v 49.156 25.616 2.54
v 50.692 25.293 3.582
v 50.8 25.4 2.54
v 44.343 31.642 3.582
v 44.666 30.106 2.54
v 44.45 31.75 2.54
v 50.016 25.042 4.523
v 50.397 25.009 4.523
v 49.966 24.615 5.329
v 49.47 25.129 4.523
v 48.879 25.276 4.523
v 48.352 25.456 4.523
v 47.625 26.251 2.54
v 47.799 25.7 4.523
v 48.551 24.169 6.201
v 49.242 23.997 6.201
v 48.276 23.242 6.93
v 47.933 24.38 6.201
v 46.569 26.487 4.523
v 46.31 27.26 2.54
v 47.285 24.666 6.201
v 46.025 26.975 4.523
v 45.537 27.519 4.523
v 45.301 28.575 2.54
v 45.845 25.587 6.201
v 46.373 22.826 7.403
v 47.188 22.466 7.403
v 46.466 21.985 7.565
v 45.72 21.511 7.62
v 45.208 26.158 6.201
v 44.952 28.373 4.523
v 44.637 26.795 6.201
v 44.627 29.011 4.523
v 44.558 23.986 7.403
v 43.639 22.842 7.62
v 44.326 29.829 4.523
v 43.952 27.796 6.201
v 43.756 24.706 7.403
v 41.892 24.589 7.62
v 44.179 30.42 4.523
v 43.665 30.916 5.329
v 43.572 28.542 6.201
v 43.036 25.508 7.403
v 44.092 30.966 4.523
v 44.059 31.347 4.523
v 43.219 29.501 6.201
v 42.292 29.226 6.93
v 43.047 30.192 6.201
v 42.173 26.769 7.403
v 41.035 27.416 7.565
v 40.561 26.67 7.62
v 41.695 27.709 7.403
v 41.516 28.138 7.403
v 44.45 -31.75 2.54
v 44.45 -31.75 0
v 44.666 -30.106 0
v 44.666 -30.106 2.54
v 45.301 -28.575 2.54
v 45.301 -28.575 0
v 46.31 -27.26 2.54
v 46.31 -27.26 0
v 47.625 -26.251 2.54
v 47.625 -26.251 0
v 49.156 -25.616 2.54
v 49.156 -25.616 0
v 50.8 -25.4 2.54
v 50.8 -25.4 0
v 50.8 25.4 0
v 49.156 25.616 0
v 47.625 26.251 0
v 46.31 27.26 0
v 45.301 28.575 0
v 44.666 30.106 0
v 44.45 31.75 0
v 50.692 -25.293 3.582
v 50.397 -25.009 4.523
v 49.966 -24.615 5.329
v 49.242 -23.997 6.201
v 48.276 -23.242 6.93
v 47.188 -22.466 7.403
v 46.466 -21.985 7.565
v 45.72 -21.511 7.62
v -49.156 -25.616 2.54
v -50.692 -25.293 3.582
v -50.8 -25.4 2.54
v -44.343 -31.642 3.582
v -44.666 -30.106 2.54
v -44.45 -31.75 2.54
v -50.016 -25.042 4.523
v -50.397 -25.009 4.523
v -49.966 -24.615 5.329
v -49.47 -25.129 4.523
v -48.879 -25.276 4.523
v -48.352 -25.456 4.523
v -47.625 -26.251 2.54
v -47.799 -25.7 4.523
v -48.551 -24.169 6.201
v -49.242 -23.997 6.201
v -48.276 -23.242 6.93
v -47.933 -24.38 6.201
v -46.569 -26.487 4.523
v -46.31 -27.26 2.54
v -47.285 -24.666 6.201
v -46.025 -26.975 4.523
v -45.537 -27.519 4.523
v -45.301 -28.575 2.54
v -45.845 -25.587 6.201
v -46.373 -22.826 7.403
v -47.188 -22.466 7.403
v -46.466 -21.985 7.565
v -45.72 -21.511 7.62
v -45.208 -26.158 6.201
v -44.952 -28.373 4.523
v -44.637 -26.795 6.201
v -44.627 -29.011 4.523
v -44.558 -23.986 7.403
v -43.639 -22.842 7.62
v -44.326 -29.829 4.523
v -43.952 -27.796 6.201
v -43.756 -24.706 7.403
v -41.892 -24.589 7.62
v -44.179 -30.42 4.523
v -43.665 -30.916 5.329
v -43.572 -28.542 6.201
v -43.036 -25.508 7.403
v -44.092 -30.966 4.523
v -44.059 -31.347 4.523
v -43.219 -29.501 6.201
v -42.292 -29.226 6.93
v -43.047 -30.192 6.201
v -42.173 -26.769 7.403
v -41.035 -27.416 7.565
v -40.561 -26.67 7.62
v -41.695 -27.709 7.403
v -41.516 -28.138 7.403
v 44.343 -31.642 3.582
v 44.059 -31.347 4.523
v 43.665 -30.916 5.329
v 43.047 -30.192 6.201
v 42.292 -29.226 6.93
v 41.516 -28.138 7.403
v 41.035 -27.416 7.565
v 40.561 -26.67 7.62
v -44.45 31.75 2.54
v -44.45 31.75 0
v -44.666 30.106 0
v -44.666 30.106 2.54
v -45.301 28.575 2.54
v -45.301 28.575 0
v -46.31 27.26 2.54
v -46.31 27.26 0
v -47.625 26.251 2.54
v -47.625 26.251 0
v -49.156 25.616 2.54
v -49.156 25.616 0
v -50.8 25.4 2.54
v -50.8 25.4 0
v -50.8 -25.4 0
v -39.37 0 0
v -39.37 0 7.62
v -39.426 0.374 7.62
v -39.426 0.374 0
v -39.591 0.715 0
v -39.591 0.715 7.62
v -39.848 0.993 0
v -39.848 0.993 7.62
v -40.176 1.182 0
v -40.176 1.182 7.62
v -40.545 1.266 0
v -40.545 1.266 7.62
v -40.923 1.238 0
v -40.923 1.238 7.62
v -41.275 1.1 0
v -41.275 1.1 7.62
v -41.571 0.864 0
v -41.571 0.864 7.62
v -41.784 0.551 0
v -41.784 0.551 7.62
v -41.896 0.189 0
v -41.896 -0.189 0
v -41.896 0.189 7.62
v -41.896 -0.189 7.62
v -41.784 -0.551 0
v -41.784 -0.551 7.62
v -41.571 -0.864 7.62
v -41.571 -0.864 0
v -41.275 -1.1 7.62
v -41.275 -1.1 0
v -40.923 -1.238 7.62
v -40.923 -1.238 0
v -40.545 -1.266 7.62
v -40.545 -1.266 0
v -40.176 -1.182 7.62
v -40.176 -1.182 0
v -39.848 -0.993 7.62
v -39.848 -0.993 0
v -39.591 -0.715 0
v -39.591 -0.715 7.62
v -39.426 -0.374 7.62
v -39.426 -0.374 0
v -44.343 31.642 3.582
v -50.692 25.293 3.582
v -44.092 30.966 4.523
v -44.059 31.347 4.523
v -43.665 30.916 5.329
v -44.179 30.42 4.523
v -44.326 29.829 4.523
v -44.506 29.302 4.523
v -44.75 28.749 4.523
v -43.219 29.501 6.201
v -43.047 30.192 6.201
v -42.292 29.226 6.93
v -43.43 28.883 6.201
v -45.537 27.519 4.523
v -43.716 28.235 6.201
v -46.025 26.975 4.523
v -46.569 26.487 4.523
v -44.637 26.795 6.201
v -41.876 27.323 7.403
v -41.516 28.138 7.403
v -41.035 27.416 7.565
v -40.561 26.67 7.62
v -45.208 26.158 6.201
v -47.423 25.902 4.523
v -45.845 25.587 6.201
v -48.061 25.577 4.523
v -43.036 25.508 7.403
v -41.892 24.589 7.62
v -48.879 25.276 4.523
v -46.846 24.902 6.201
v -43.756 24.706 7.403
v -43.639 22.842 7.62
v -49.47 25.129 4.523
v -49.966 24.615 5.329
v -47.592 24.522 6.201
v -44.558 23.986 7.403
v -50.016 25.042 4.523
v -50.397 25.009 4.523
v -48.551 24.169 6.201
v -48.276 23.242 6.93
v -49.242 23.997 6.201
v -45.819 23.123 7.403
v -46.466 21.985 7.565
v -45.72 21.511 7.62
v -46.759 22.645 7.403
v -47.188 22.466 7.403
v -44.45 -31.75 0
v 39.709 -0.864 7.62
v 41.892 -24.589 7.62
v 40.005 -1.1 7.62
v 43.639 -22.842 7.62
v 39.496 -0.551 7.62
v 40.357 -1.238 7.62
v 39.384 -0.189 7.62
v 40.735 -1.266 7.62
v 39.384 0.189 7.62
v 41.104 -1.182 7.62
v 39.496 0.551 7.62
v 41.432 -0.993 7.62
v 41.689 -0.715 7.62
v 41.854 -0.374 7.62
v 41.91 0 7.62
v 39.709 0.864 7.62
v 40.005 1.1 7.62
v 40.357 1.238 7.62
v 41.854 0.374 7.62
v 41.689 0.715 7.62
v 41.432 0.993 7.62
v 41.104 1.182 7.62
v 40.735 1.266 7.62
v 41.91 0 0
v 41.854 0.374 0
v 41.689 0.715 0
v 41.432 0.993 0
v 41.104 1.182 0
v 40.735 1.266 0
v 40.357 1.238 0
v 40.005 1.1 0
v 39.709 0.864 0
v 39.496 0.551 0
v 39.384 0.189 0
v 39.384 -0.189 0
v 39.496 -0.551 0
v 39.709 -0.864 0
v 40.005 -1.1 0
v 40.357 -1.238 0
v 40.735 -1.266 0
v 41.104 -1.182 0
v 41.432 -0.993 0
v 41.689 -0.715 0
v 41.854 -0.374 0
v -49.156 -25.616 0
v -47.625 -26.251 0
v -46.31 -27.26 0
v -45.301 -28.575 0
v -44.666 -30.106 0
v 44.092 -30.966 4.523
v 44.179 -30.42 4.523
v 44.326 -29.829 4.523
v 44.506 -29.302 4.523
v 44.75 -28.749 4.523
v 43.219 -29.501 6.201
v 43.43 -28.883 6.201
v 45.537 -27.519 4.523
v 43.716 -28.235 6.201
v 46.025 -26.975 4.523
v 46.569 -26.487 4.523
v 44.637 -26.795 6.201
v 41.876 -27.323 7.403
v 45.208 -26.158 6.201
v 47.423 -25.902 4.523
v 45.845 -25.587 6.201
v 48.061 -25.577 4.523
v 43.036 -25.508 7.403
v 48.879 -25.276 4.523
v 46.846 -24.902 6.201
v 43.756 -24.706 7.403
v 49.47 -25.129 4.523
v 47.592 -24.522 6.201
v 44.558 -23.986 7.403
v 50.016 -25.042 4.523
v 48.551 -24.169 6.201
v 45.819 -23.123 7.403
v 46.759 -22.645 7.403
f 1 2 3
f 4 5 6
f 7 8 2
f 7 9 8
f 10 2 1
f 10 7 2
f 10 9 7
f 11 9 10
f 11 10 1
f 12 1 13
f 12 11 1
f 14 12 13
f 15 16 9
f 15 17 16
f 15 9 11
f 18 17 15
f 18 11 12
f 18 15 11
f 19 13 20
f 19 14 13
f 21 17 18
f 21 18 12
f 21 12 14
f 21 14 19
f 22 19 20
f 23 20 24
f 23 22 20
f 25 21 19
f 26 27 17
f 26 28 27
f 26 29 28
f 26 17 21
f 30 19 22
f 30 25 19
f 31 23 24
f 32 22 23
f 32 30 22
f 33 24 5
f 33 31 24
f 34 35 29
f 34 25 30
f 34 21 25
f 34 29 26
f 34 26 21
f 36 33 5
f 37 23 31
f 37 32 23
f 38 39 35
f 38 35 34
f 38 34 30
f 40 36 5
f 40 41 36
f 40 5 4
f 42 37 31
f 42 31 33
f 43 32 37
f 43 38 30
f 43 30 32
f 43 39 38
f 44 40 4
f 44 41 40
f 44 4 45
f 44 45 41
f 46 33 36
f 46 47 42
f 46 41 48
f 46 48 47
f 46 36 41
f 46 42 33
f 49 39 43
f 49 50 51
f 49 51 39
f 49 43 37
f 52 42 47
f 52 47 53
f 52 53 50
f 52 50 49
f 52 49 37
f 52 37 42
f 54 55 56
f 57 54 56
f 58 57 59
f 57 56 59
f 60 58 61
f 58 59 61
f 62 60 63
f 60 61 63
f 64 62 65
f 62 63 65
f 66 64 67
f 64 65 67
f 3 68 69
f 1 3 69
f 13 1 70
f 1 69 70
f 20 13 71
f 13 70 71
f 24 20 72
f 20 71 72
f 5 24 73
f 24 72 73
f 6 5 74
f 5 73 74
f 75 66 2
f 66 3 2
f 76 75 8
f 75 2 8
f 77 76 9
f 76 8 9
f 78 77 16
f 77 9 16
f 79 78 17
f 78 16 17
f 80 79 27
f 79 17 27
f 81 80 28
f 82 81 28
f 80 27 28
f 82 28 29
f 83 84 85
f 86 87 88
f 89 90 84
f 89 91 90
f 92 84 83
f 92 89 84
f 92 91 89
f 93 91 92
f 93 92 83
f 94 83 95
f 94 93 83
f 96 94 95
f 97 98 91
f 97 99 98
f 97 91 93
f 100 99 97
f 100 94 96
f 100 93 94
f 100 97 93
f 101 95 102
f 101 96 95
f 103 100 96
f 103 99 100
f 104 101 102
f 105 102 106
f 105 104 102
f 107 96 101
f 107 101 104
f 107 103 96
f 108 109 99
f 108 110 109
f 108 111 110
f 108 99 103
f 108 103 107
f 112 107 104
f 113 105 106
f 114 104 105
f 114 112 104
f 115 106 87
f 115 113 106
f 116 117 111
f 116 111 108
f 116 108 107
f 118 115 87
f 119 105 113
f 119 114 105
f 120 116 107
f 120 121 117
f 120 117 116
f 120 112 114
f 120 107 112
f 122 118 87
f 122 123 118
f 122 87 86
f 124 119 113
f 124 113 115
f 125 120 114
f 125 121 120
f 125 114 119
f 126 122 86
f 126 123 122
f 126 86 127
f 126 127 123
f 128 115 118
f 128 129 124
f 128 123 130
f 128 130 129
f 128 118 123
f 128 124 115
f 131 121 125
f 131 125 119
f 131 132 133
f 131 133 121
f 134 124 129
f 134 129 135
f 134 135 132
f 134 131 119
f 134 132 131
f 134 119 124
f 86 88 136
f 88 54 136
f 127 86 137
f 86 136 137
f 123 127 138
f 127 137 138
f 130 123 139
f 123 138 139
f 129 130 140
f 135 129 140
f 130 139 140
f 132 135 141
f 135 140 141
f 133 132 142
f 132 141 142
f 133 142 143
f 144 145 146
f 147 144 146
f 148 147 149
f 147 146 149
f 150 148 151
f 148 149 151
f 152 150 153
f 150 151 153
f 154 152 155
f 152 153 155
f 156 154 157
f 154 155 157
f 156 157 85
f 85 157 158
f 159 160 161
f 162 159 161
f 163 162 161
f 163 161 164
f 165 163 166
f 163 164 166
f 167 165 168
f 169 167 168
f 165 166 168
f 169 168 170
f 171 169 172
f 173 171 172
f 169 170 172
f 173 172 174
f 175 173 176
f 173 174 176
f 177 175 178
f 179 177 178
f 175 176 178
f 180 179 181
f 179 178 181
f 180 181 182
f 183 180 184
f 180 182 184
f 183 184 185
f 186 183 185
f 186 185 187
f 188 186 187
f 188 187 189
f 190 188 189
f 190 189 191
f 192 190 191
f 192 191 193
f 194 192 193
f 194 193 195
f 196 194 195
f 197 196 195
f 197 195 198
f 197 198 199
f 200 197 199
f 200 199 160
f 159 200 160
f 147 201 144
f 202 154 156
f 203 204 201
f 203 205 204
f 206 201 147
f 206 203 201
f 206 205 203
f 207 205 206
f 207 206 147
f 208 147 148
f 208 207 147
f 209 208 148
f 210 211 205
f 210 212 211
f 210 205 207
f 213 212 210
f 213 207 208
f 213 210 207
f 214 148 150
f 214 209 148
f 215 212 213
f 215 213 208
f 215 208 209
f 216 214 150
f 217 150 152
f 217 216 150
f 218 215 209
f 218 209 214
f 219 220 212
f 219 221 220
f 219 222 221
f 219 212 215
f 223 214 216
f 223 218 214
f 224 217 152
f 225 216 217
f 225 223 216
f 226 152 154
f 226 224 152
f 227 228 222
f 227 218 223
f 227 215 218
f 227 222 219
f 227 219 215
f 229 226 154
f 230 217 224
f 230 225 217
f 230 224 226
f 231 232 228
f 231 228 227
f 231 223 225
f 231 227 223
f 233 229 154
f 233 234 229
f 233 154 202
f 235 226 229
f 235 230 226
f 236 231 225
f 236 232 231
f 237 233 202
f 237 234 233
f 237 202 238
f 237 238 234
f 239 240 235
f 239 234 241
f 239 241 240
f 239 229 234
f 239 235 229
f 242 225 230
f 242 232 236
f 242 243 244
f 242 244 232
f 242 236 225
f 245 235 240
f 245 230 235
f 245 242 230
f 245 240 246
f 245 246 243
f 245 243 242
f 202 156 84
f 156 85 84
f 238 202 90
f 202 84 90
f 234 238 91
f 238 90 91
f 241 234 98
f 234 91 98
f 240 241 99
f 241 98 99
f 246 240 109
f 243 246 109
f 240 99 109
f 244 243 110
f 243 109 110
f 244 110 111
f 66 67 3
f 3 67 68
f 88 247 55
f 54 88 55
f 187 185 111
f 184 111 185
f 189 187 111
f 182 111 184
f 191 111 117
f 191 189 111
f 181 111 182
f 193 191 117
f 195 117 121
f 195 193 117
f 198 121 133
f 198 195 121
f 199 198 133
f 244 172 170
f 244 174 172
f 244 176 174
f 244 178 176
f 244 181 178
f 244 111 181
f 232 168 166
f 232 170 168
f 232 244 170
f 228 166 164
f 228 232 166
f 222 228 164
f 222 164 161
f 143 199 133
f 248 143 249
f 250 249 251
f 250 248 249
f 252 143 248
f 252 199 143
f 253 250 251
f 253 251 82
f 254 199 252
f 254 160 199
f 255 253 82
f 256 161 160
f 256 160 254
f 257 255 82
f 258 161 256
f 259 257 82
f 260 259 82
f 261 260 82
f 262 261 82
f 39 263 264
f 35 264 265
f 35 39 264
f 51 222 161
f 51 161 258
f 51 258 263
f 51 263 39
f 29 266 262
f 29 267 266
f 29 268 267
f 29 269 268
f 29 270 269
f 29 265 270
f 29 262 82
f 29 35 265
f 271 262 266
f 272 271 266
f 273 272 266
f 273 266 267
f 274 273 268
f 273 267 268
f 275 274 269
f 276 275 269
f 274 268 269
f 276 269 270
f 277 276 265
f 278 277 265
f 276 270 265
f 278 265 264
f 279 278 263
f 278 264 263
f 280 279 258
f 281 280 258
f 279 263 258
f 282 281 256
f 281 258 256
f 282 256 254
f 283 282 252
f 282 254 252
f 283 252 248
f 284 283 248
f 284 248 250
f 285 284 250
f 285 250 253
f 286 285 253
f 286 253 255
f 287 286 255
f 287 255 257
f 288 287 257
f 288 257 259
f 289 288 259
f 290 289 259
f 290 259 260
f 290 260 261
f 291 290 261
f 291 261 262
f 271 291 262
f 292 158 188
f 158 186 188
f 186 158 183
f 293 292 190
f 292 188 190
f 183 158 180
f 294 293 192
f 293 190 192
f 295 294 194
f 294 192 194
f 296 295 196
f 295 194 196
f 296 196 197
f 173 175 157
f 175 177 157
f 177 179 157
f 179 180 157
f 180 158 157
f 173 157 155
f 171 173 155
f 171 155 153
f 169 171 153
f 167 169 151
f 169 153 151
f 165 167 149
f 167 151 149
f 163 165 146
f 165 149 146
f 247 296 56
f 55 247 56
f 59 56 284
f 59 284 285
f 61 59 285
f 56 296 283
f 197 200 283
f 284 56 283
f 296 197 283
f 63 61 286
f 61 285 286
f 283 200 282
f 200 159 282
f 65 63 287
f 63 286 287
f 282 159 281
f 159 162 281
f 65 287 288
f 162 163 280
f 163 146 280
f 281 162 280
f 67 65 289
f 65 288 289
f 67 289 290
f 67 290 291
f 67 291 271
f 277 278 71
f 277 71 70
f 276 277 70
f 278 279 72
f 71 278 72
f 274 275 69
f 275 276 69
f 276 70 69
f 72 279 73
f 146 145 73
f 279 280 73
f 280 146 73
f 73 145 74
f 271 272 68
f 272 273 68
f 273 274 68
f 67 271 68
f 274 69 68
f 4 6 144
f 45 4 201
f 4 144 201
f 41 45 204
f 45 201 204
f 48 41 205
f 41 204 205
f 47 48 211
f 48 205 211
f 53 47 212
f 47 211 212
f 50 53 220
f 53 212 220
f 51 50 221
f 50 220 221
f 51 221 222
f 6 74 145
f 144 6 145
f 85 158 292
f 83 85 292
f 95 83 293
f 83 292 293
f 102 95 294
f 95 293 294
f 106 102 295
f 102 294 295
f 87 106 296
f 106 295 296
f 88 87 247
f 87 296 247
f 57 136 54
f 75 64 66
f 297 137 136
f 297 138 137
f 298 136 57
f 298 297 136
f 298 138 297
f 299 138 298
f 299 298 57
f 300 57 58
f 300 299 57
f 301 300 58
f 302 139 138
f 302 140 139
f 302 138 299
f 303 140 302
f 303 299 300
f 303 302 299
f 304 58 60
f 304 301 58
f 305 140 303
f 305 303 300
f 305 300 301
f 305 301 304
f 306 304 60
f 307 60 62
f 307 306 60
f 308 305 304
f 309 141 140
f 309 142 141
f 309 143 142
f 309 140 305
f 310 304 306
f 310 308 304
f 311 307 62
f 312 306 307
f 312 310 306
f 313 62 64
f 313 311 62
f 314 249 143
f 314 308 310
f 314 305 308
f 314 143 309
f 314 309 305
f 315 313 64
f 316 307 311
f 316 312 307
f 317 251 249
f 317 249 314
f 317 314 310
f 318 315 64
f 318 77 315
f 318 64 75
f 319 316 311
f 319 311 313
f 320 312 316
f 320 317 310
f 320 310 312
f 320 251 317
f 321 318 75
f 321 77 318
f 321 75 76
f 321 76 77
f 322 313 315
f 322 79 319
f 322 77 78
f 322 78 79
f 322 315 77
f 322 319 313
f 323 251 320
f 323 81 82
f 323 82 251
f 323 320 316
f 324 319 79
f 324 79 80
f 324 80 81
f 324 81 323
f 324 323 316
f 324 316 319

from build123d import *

# Parameters (mm, degrees)
F1_DEPTH = 7.62
F2_R     = 5.08
F3_R     = 1.27
F4_DEPTH = 25.4


with BuildPart() as f1:
    # F0 (on Top) → F1 (new body)
    with BuildSketch(Plane.XY):
        with BuildLine():
            Line((44.45, 31.75), (-44.45, 31.75))
            ThreePointArc((-44.45, 31.75), (-46.3098719395, 27.2598719395), (-50.8, 25.4))
            Line((-50.8, 25.4), (-50.8, -25.4))
            ThreePointArc((-50.8, -25.4), (-46.3098719395, -27.2598719395), (-44.45, -31.75))
            Line((-44.45, -31.75), (44.45, -31.75))
            ThreePointArc((44.45, -31.75), (46.3098719395, -27.2598719395), (50.8, -25.4))
            Line((50.8, -25.4), (50.8, 25.4))
            ThreePointArc((50.8, 25.4), (46.3098719395, 27.2598719395), (44.45, 31.75))
        make_face()
    extrude(amount=F1_DEPTH)

    # F2
    f2_edges = [f1.edges().sort_by_distance(p)[0] for p in [
        (0, 31.75, 7.62),
        (-50.8, 0, 7.62),
        (50.8, 0, 7.62),
        (0, -31.75, 7.62),
        (-46.309872, 27.259872, 7.62),
        (-46.309872, -27.259872, 7.62),
        (46.309872, -27.259872, 7.62),
        (46.309872, 27.259872, 7.62),
    ]]
    fillet(f2_edges, radius=F2_R)

    # F3 (on face) → F4 (cut)
    with BuildSketch(Plane.XY.offset(7.62)):
        with Locations((-40.64, 0)):
            Circle(F3_R)
        with Locations((40.64, 0)):
            Circle(F3_R)
    extrude(amount=-F4_DEPTH, mode=Mode.SUBTRACT)


solid = f1.part
